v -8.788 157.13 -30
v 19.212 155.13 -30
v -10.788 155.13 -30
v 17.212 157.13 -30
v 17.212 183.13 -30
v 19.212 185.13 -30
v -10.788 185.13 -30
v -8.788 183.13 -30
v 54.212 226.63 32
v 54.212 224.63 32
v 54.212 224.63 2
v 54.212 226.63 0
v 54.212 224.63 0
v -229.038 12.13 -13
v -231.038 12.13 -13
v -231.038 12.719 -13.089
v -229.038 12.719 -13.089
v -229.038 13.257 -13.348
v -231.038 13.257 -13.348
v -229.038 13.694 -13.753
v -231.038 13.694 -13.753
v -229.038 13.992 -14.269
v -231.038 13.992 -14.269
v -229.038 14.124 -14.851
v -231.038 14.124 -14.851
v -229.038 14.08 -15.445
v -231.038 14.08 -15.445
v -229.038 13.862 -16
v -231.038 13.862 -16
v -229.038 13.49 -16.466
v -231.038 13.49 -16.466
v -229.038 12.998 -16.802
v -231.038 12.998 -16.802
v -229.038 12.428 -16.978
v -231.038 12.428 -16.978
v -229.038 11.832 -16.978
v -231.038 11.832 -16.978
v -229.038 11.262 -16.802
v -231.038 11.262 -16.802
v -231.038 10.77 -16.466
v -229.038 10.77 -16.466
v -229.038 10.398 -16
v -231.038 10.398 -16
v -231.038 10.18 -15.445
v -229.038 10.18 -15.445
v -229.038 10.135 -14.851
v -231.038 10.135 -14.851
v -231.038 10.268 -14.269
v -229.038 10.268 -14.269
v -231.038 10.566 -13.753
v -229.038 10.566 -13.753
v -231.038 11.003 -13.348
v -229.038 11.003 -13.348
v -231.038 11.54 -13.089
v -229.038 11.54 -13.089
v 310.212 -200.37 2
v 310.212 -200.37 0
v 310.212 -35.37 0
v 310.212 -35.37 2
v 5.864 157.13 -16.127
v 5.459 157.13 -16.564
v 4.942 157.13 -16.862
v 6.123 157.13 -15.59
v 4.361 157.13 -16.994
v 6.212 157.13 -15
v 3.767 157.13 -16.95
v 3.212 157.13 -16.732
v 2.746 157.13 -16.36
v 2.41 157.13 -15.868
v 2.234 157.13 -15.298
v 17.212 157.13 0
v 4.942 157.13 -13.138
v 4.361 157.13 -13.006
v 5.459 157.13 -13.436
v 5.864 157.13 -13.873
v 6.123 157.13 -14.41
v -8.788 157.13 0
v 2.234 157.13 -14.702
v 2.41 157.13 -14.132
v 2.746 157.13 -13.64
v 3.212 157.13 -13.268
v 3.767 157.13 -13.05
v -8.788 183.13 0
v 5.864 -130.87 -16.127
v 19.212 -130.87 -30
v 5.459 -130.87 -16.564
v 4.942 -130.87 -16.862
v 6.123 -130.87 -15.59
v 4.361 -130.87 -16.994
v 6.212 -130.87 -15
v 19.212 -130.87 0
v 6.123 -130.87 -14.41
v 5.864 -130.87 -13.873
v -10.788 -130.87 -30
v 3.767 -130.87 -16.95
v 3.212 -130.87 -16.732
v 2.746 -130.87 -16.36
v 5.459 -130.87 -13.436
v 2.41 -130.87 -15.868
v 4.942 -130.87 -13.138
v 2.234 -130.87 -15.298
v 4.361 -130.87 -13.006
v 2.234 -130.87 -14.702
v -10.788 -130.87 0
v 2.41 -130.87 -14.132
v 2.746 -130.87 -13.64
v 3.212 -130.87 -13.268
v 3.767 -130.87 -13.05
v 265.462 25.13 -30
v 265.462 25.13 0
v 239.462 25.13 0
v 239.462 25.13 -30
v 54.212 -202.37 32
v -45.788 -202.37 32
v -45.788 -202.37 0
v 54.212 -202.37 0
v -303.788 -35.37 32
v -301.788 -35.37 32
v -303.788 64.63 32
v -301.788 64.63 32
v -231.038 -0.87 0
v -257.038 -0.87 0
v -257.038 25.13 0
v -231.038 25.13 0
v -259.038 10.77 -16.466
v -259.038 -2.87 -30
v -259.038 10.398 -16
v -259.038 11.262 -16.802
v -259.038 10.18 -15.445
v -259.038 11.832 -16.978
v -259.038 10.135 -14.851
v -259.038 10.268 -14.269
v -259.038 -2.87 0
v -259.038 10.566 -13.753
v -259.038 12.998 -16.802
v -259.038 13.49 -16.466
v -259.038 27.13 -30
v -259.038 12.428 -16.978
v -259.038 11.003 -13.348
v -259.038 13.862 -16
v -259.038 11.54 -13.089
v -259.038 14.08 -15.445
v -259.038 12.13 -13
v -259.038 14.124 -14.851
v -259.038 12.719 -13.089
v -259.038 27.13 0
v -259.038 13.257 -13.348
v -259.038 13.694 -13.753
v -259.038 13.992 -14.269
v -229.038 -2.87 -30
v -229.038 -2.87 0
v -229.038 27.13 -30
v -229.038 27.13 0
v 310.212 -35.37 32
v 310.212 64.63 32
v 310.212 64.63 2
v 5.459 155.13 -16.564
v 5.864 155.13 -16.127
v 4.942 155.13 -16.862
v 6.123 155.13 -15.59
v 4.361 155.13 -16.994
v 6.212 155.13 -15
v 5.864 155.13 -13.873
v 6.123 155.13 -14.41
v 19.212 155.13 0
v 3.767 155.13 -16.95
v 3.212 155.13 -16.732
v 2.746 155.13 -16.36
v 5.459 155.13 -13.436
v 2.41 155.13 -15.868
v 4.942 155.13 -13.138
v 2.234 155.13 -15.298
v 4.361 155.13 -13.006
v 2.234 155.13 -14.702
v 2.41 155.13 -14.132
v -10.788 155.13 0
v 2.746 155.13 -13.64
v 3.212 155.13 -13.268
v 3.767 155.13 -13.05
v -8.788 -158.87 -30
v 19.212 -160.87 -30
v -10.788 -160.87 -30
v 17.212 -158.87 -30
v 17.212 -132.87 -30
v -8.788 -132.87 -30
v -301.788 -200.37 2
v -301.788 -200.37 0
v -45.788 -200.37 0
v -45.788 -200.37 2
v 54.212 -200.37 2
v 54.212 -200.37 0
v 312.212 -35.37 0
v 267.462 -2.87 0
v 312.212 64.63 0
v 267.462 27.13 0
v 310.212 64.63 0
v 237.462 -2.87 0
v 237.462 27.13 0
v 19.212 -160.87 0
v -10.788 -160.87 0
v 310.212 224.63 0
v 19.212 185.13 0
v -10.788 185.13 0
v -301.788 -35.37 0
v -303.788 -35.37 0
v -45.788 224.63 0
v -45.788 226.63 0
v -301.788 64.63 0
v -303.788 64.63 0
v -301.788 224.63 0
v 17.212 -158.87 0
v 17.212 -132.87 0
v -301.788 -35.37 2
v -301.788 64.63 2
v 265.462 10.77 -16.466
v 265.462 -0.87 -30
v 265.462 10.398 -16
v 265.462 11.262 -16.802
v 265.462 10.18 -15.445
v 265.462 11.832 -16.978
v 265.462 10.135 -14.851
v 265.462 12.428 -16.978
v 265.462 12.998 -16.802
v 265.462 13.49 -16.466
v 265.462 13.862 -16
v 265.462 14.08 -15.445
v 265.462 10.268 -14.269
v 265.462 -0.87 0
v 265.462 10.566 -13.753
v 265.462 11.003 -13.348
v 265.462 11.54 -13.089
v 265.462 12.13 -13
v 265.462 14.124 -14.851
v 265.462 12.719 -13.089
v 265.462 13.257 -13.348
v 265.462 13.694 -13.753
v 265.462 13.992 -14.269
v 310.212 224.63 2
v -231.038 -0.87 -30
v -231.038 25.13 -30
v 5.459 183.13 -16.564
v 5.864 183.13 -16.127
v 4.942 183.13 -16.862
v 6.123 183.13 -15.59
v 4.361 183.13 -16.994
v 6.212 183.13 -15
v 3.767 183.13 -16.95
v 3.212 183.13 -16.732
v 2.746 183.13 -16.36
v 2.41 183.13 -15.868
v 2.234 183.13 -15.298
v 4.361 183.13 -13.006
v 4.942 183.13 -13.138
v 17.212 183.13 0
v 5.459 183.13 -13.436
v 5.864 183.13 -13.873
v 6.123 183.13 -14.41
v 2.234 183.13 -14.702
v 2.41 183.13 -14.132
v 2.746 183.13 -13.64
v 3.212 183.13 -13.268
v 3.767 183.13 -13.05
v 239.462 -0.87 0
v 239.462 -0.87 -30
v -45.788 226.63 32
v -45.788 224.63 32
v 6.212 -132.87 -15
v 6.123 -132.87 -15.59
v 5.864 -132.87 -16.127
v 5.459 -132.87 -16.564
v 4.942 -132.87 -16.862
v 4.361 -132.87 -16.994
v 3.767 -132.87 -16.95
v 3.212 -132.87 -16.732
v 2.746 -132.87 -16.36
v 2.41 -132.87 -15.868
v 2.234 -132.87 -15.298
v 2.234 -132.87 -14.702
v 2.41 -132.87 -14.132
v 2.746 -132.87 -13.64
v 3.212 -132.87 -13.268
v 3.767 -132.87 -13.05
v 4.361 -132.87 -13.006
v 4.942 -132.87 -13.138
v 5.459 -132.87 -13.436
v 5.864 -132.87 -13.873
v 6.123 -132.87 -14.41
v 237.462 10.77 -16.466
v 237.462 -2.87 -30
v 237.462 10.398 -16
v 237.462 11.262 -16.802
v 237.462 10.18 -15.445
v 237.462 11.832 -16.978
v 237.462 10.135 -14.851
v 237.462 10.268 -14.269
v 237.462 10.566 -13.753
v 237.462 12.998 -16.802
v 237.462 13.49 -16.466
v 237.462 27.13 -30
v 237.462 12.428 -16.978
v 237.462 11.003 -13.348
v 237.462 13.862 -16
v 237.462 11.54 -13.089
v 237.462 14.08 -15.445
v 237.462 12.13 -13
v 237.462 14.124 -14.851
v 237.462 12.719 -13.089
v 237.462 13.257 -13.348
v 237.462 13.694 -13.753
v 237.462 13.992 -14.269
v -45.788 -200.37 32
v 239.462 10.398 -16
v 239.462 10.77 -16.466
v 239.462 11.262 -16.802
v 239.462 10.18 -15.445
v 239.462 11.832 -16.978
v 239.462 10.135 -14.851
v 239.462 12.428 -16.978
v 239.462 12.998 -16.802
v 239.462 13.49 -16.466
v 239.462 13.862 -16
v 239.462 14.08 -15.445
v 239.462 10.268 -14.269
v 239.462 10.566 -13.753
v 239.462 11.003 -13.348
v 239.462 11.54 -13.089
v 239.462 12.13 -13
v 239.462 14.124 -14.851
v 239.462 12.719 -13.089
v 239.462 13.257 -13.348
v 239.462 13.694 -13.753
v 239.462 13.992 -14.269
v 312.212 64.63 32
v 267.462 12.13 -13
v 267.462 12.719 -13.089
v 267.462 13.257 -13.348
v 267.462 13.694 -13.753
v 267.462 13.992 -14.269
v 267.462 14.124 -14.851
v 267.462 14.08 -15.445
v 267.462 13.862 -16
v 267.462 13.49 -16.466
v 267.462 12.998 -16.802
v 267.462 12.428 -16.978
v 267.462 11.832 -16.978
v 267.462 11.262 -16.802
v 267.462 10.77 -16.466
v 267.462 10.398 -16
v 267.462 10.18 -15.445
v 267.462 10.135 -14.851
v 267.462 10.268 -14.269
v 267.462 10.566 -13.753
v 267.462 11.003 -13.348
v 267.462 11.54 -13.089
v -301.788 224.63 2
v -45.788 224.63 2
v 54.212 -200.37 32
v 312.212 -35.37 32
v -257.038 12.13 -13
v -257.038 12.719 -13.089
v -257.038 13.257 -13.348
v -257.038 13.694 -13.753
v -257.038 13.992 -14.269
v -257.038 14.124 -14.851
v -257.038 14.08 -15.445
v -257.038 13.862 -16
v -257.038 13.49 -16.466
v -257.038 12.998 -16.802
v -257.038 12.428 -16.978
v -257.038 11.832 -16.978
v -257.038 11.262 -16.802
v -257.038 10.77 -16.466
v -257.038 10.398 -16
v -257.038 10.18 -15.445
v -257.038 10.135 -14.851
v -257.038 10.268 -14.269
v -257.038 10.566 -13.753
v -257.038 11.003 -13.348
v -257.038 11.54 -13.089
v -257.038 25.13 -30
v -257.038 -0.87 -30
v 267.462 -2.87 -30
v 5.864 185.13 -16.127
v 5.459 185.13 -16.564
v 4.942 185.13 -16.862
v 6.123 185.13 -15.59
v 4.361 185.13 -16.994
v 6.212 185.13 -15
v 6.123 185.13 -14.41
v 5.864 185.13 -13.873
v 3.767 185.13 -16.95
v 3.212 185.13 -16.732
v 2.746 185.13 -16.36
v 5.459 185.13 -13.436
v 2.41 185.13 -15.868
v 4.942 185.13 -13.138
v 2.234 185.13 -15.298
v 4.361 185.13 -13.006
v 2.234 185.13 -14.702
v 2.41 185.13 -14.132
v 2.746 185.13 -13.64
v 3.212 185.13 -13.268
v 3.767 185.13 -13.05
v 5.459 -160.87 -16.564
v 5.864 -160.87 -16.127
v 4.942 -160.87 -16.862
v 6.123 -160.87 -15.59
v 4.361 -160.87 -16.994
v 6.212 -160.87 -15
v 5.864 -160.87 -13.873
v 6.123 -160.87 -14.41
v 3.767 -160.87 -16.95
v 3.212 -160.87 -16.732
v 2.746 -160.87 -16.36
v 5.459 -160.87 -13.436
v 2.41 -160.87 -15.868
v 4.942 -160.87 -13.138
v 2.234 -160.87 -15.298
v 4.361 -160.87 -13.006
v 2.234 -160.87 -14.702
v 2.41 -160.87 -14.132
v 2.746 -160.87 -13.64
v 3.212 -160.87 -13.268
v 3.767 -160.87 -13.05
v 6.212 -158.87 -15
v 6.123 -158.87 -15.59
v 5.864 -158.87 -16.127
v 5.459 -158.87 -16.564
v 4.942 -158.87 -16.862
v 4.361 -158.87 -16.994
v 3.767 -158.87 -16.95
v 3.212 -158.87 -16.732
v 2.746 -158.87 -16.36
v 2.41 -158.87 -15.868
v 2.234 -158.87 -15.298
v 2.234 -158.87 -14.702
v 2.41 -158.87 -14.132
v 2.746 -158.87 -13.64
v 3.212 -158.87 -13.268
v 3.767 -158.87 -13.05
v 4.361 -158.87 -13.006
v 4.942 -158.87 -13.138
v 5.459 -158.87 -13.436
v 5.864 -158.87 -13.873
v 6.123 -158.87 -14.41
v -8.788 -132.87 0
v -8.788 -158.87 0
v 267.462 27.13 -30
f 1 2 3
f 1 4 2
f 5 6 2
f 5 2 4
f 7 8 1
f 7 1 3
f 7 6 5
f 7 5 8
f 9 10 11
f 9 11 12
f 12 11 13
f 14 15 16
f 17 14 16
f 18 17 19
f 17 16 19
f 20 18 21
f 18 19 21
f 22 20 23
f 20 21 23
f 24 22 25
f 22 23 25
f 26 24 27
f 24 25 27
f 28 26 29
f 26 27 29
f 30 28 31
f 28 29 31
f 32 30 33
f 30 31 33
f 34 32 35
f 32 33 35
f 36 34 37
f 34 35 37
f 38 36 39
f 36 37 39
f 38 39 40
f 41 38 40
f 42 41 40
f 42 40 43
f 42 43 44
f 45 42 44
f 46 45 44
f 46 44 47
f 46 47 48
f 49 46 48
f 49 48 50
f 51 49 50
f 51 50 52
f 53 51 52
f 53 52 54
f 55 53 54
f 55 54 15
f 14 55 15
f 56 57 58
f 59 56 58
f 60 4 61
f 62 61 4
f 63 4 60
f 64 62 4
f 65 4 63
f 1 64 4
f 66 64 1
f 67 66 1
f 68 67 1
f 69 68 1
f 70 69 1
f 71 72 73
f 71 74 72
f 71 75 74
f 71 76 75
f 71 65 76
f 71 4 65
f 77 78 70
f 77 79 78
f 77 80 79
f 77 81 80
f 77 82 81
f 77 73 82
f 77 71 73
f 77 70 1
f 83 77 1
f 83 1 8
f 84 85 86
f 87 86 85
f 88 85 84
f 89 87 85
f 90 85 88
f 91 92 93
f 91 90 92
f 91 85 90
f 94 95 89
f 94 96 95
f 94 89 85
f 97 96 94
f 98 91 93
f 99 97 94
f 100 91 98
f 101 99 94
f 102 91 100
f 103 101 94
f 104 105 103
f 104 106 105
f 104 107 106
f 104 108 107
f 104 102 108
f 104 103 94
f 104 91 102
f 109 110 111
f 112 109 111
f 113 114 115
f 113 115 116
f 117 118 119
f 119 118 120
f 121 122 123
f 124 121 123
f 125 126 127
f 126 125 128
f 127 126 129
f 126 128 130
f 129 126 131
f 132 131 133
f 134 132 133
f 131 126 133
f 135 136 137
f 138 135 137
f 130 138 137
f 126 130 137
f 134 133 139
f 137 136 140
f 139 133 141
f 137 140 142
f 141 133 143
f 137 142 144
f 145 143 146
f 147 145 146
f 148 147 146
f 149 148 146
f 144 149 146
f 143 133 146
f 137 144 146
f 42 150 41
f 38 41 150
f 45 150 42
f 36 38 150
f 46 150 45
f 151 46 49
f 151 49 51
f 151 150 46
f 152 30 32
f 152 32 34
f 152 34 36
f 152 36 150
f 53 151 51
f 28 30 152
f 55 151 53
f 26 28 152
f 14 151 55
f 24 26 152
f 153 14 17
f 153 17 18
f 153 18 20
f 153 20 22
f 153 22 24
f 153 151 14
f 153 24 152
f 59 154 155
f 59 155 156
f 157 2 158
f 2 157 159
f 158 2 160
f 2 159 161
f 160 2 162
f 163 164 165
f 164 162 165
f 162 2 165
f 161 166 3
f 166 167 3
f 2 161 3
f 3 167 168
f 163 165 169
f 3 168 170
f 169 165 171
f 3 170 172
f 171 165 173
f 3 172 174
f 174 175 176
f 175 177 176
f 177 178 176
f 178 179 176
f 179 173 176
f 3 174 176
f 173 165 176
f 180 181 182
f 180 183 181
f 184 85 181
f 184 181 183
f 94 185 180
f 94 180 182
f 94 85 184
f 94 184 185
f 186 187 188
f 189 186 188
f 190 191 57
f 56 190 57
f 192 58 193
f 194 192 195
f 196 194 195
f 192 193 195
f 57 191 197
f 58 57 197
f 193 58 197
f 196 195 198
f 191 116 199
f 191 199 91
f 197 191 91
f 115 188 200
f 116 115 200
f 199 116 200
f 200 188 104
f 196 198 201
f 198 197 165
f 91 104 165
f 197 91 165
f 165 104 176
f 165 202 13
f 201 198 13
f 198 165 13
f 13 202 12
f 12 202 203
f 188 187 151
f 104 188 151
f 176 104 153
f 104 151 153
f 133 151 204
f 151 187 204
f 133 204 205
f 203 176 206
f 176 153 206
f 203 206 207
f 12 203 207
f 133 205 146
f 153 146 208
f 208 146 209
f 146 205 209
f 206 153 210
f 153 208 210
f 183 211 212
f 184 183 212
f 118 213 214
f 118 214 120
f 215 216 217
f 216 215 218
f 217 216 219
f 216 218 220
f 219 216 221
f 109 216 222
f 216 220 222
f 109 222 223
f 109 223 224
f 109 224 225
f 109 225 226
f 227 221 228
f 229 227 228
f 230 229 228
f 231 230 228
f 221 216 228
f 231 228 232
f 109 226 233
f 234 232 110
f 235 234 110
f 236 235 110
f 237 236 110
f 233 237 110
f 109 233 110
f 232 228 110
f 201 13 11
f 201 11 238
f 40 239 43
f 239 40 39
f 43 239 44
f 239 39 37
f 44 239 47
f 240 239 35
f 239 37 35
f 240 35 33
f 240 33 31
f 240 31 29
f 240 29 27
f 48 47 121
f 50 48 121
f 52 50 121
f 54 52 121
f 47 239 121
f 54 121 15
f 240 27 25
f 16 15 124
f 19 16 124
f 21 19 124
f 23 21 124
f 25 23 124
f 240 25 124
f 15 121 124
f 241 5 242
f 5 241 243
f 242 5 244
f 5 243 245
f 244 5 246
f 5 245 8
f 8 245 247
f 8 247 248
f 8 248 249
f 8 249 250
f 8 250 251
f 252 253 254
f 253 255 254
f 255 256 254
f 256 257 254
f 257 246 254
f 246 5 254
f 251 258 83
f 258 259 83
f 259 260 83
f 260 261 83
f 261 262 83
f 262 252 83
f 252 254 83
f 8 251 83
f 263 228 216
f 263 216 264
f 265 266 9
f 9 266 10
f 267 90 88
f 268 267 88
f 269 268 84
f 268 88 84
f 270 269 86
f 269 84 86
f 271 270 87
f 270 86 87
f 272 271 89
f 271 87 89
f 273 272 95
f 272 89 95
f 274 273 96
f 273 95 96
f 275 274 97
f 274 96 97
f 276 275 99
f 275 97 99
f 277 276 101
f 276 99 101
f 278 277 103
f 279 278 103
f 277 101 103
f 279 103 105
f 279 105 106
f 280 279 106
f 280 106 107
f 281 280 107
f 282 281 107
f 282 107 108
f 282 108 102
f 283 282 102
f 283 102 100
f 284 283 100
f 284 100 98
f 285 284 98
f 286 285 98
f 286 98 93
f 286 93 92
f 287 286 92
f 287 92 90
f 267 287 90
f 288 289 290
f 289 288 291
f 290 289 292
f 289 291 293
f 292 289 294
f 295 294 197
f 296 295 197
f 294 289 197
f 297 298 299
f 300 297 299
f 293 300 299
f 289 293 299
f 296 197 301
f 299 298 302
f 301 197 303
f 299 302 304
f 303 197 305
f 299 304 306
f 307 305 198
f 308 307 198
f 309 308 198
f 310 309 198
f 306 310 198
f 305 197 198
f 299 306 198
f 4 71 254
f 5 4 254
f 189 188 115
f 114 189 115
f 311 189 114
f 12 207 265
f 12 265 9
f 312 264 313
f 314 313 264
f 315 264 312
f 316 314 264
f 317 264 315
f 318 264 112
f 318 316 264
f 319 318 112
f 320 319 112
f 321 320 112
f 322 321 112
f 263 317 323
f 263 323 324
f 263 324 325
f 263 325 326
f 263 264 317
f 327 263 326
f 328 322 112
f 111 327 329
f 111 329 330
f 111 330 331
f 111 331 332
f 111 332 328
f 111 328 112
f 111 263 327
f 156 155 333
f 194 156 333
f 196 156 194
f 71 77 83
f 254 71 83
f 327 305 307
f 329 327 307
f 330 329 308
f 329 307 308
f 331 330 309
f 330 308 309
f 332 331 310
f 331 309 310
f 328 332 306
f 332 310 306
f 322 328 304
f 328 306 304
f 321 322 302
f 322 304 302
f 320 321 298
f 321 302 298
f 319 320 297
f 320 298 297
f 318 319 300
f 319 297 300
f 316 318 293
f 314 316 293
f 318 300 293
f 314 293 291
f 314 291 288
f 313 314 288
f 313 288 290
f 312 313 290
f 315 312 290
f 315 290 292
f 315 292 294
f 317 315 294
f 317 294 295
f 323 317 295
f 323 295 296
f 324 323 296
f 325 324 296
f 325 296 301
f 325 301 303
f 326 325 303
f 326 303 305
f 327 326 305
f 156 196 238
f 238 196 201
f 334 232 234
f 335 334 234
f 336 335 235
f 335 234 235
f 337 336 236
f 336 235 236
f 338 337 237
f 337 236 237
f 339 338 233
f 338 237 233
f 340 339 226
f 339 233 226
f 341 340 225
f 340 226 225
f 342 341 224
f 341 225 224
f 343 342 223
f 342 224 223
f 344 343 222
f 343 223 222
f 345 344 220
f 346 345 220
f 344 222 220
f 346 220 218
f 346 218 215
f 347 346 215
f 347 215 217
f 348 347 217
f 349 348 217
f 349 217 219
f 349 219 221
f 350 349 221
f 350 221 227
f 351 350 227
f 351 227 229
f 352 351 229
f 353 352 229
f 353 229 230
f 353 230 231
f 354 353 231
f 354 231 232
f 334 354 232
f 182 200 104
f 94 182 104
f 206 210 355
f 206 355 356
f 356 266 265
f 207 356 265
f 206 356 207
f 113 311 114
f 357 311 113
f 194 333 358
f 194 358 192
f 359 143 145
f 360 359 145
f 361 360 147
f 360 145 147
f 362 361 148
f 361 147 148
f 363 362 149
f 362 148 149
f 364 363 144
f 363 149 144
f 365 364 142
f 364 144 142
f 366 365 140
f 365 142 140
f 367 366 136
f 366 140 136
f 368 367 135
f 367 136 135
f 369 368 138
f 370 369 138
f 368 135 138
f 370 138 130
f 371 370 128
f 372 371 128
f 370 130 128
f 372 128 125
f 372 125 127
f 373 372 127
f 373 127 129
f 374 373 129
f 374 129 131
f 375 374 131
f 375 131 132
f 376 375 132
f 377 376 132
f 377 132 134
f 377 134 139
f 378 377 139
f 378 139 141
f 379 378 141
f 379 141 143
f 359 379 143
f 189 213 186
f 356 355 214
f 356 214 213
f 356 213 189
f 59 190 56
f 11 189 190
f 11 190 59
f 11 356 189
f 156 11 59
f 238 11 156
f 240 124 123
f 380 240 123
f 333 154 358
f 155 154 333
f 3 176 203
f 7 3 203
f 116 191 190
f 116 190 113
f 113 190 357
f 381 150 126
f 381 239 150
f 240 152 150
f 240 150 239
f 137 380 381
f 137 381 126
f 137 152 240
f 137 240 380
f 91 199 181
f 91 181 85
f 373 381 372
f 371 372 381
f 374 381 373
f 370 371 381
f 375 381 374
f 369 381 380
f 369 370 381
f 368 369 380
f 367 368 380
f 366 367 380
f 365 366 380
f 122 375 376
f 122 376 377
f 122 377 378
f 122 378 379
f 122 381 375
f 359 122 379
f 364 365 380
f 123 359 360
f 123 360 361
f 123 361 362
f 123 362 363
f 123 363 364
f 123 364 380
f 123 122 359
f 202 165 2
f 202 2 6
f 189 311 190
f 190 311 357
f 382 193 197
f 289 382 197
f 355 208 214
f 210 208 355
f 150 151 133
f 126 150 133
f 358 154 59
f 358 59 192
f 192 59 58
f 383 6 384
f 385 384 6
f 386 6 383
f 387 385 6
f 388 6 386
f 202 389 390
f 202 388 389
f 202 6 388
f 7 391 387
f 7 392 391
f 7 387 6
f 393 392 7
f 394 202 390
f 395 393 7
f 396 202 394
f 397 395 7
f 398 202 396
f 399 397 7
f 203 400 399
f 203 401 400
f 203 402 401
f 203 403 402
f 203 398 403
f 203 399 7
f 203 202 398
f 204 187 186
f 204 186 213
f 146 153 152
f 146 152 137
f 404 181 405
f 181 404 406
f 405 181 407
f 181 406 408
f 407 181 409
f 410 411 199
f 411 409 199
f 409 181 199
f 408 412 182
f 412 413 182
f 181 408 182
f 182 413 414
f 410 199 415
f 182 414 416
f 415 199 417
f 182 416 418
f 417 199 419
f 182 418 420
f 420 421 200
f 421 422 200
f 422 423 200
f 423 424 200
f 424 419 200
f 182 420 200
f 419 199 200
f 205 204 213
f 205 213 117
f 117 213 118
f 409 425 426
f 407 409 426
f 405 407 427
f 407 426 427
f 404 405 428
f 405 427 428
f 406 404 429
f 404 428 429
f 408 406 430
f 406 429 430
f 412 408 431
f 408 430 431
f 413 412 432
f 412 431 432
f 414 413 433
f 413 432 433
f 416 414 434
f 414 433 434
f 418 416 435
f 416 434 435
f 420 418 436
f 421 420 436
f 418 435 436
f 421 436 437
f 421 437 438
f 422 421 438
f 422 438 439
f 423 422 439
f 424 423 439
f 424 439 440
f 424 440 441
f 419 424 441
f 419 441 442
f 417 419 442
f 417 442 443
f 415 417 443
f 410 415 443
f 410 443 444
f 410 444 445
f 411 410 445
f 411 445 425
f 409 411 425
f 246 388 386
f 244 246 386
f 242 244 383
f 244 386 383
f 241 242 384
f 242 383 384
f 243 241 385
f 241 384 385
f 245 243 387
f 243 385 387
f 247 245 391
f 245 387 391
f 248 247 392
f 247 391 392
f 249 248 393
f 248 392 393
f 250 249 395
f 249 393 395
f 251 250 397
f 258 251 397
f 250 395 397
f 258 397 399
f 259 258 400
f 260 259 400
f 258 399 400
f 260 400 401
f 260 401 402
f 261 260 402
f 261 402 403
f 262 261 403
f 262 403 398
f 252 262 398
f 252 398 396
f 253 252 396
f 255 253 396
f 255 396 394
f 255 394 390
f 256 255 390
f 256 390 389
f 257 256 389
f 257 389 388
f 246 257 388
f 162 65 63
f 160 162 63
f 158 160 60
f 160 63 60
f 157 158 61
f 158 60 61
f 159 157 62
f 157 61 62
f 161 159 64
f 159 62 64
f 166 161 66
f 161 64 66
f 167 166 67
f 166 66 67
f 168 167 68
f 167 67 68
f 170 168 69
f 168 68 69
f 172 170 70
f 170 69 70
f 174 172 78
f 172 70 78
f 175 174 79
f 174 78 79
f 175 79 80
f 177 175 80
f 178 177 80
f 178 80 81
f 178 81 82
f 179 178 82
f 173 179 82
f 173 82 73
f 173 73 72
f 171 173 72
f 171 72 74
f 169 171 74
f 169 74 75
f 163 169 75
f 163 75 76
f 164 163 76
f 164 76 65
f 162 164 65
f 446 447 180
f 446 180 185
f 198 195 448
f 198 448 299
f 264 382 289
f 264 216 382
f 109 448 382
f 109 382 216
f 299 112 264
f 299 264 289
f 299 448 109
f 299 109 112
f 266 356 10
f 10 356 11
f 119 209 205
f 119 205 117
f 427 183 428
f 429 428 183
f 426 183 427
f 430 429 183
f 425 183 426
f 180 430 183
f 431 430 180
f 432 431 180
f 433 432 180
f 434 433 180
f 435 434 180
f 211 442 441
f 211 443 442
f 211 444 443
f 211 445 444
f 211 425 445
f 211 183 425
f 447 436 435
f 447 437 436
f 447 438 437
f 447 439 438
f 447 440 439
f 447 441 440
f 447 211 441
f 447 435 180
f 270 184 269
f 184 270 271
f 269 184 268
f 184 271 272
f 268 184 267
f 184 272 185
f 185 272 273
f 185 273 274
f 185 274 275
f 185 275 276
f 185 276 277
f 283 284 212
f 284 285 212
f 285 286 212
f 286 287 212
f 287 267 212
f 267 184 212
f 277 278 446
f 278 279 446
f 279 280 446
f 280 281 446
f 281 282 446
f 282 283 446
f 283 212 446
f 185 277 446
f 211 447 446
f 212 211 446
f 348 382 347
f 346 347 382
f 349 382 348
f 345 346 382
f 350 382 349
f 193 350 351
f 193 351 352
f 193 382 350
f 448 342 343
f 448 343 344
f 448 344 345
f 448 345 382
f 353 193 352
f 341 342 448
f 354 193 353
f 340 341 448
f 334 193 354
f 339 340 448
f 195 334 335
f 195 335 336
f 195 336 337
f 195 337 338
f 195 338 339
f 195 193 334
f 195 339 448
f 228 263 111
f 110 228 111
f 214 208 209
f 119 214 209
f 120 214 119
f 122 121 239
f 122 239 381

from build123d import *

# Parameters (mm, degrees)
SKETCH_1_W          = 612
SKETCH_1_H          = 425
EXTRUDE_1_DEPTH     = 2
SKETCH_2_W          = 100
SKETCH_2_H          = 32
EXTRUDE_2_DEPTH     = 2
SKETCH_3_W          = 32
SKETCH_3_H          = 100
EXTRUDE_3_DEPTH     = 2
SKETCH_4_W          = 100
SKETCH_4_H          = 32
EXTRUDE_4_DEPTH     = 2
SKETCH_5_W          = 32
SKETCH_5_H          = 100
EXTRUDE_5_DEPTH     = 2
SKETCH_6_W          = 30
SKETCH_6_H          = 30
SKETCH_6_W_2        = 26
SKETCH_6_H_2        = 26
EXTRUDE_6_DEPTH     = 30
SKETCH_7_W          = 30
SKETCH_7_H          = 30
SKETCH_7_W_2        = 26
SKETCH_7_H_2        = 26
EXTRUDE_7_DEPTH     = 30
SKETCH_8_R          = 2
CUT_EXTRUDE_1_DEPTH = 388.5
SKETCH_9_R          = 2
CUT_EXTRUDE_2_DEPTH = 572.25


with BuildPart() as part:
    # 草圖1 → 填料-伸長1 (new body)
    with BuildSketch(Plane.XY):
        with Locations((4.21177851, 12.129893238)):
            Rectangle(SKETCH_1_W, SKETCH_1_H)
    extrude(amount=EXTRUDE_1_DEPTH)

    # 草圖2 → 填料-伸長2 (add)
    with BuildSketch(Plane.XZ.offset(200.370106762)):
        with Locations((4.21177851, 16)):
            Rectangle(SKETCH_2_W, SKETCH_2_H)
    extrude(amount=EXTRUDE_2_DEPTH)

    # 草圖3 → 填料-伸長3 (add)
    with BuildSketch(Plane.ZY.offset(301.78822149)):
        with Locations((16, 14.629893238)):
            Rectangle(SKETCH_3_W, SKETCH_3_H)
    extrude(amount=EXTRUDE_3_DEPTH)

    # 草圖4 → 填料-伸長4 (add)
    with BuildSketch(Plane(origin=(0, 224.629893238, 0), x_dir=(1, 0, 0), z_dir=(0, 1, 0))):
        with Locations((4.21177851, -16)):
            Rectangle(SKETCH_4_W, SKETCH_4_H)
    extrude(amount=EXTRUDE_4_DEPTH)

    # 草圖5 → 填料-伸長5 (add)
    with BuildSketch(Plane(origin=(310.21177851, 0, 0), x_dir=(0, 0, -1), z_dir=(1, 0, 0))):
        with Locations((-16, 14.629893238)):
            Rectangle(SKETCH_5_W, SKETCH_5_H)
    extrude(amount=EXTRUDE_5_DEPTH)

    # 草圖6 → 填料-伸長6 (add)
    with BuildSketch(Plane(origin=(0, 0, 0), x_dir=(-1, 0, 0), z_dir=(0, 0, -1))):
        with Locations((-252.46177851, 12.129893238)):
            Rectangle(SKETCH_6_W, SKETCH_6_H)
        with Locations((-252.46177851, 12.129893238)):
            Rectangle(SKETCH_6_W_2, SKETCH_6_H_2, mode=Mode.SUBTRACT)
        with Locations((244.03822149, 12.129893238)):
            Rectangle(SKETCH_6_W, SKETCH_6_H)
        with Locations((244.03822149, 12.129893238)):
            Rectangle(SKETCH_6_W_2, SKETCH_6_H_2, mode=Mode.SUBTRACT)
    extrude(amount=EXTRUDE_6_DEPTH)

    # 草圖7 → 填料-伸長7 (add)
    with BuildSketch(Plane(origin=(0, 0, 0), x_dir=(-1, 0, 0), z_dir=(0, 0, -1))):
        with Locations((-4.21177851, -145.870106762)):
            Rectangle(SKETCH_7_W, SKETCH_7_H)
        with Locations((-4.21177851, -145.870106762)):
            Rectangle(SKETCH_7_W_2, SKETCH_7_H_2, mode=Mode.SUBTRACT)
        with Locations((-4.21177851, 170.129893238)):
            Rectangle(SKETCH_7_W, SKETCH_7_H)
        with Locations((-4.21177851, 170.129893238)):
            Rectangle(SKETCH_7_W_2, SKETCH_7_H_2, mode=Mode.SUBTRACT)
    extrude(amount=EXTRUDE_7_DEPTH)

    # 草圖8 → 除料-伸長1 (cut, through all)
    with BuildSketch(Plane(origin=(0, 185.129893238, 0), x_dir=(1, 0, 0), z_dir=(0, 1, 0))):
        with Locations((4.21177851, 15)):
            Circle(SKETCH_8_R)
    extrude(amount=-CUT_EXTRUDE_1_DEPTH, mode=Mode.SUBTRACT)

    # 草圖9 → 除料-伸長2 (cut, through all)
    with BuildSketch(Plane.ZY.offset(259.03822149)):
        with Locations((-15, 12.129893238)):
            Circle(SKETCH_9_R)
    extrude(amount=-CUT_EXTRUDE_2_DEPTH, mode=Mode.SUBTRACT)


solid = part.part
